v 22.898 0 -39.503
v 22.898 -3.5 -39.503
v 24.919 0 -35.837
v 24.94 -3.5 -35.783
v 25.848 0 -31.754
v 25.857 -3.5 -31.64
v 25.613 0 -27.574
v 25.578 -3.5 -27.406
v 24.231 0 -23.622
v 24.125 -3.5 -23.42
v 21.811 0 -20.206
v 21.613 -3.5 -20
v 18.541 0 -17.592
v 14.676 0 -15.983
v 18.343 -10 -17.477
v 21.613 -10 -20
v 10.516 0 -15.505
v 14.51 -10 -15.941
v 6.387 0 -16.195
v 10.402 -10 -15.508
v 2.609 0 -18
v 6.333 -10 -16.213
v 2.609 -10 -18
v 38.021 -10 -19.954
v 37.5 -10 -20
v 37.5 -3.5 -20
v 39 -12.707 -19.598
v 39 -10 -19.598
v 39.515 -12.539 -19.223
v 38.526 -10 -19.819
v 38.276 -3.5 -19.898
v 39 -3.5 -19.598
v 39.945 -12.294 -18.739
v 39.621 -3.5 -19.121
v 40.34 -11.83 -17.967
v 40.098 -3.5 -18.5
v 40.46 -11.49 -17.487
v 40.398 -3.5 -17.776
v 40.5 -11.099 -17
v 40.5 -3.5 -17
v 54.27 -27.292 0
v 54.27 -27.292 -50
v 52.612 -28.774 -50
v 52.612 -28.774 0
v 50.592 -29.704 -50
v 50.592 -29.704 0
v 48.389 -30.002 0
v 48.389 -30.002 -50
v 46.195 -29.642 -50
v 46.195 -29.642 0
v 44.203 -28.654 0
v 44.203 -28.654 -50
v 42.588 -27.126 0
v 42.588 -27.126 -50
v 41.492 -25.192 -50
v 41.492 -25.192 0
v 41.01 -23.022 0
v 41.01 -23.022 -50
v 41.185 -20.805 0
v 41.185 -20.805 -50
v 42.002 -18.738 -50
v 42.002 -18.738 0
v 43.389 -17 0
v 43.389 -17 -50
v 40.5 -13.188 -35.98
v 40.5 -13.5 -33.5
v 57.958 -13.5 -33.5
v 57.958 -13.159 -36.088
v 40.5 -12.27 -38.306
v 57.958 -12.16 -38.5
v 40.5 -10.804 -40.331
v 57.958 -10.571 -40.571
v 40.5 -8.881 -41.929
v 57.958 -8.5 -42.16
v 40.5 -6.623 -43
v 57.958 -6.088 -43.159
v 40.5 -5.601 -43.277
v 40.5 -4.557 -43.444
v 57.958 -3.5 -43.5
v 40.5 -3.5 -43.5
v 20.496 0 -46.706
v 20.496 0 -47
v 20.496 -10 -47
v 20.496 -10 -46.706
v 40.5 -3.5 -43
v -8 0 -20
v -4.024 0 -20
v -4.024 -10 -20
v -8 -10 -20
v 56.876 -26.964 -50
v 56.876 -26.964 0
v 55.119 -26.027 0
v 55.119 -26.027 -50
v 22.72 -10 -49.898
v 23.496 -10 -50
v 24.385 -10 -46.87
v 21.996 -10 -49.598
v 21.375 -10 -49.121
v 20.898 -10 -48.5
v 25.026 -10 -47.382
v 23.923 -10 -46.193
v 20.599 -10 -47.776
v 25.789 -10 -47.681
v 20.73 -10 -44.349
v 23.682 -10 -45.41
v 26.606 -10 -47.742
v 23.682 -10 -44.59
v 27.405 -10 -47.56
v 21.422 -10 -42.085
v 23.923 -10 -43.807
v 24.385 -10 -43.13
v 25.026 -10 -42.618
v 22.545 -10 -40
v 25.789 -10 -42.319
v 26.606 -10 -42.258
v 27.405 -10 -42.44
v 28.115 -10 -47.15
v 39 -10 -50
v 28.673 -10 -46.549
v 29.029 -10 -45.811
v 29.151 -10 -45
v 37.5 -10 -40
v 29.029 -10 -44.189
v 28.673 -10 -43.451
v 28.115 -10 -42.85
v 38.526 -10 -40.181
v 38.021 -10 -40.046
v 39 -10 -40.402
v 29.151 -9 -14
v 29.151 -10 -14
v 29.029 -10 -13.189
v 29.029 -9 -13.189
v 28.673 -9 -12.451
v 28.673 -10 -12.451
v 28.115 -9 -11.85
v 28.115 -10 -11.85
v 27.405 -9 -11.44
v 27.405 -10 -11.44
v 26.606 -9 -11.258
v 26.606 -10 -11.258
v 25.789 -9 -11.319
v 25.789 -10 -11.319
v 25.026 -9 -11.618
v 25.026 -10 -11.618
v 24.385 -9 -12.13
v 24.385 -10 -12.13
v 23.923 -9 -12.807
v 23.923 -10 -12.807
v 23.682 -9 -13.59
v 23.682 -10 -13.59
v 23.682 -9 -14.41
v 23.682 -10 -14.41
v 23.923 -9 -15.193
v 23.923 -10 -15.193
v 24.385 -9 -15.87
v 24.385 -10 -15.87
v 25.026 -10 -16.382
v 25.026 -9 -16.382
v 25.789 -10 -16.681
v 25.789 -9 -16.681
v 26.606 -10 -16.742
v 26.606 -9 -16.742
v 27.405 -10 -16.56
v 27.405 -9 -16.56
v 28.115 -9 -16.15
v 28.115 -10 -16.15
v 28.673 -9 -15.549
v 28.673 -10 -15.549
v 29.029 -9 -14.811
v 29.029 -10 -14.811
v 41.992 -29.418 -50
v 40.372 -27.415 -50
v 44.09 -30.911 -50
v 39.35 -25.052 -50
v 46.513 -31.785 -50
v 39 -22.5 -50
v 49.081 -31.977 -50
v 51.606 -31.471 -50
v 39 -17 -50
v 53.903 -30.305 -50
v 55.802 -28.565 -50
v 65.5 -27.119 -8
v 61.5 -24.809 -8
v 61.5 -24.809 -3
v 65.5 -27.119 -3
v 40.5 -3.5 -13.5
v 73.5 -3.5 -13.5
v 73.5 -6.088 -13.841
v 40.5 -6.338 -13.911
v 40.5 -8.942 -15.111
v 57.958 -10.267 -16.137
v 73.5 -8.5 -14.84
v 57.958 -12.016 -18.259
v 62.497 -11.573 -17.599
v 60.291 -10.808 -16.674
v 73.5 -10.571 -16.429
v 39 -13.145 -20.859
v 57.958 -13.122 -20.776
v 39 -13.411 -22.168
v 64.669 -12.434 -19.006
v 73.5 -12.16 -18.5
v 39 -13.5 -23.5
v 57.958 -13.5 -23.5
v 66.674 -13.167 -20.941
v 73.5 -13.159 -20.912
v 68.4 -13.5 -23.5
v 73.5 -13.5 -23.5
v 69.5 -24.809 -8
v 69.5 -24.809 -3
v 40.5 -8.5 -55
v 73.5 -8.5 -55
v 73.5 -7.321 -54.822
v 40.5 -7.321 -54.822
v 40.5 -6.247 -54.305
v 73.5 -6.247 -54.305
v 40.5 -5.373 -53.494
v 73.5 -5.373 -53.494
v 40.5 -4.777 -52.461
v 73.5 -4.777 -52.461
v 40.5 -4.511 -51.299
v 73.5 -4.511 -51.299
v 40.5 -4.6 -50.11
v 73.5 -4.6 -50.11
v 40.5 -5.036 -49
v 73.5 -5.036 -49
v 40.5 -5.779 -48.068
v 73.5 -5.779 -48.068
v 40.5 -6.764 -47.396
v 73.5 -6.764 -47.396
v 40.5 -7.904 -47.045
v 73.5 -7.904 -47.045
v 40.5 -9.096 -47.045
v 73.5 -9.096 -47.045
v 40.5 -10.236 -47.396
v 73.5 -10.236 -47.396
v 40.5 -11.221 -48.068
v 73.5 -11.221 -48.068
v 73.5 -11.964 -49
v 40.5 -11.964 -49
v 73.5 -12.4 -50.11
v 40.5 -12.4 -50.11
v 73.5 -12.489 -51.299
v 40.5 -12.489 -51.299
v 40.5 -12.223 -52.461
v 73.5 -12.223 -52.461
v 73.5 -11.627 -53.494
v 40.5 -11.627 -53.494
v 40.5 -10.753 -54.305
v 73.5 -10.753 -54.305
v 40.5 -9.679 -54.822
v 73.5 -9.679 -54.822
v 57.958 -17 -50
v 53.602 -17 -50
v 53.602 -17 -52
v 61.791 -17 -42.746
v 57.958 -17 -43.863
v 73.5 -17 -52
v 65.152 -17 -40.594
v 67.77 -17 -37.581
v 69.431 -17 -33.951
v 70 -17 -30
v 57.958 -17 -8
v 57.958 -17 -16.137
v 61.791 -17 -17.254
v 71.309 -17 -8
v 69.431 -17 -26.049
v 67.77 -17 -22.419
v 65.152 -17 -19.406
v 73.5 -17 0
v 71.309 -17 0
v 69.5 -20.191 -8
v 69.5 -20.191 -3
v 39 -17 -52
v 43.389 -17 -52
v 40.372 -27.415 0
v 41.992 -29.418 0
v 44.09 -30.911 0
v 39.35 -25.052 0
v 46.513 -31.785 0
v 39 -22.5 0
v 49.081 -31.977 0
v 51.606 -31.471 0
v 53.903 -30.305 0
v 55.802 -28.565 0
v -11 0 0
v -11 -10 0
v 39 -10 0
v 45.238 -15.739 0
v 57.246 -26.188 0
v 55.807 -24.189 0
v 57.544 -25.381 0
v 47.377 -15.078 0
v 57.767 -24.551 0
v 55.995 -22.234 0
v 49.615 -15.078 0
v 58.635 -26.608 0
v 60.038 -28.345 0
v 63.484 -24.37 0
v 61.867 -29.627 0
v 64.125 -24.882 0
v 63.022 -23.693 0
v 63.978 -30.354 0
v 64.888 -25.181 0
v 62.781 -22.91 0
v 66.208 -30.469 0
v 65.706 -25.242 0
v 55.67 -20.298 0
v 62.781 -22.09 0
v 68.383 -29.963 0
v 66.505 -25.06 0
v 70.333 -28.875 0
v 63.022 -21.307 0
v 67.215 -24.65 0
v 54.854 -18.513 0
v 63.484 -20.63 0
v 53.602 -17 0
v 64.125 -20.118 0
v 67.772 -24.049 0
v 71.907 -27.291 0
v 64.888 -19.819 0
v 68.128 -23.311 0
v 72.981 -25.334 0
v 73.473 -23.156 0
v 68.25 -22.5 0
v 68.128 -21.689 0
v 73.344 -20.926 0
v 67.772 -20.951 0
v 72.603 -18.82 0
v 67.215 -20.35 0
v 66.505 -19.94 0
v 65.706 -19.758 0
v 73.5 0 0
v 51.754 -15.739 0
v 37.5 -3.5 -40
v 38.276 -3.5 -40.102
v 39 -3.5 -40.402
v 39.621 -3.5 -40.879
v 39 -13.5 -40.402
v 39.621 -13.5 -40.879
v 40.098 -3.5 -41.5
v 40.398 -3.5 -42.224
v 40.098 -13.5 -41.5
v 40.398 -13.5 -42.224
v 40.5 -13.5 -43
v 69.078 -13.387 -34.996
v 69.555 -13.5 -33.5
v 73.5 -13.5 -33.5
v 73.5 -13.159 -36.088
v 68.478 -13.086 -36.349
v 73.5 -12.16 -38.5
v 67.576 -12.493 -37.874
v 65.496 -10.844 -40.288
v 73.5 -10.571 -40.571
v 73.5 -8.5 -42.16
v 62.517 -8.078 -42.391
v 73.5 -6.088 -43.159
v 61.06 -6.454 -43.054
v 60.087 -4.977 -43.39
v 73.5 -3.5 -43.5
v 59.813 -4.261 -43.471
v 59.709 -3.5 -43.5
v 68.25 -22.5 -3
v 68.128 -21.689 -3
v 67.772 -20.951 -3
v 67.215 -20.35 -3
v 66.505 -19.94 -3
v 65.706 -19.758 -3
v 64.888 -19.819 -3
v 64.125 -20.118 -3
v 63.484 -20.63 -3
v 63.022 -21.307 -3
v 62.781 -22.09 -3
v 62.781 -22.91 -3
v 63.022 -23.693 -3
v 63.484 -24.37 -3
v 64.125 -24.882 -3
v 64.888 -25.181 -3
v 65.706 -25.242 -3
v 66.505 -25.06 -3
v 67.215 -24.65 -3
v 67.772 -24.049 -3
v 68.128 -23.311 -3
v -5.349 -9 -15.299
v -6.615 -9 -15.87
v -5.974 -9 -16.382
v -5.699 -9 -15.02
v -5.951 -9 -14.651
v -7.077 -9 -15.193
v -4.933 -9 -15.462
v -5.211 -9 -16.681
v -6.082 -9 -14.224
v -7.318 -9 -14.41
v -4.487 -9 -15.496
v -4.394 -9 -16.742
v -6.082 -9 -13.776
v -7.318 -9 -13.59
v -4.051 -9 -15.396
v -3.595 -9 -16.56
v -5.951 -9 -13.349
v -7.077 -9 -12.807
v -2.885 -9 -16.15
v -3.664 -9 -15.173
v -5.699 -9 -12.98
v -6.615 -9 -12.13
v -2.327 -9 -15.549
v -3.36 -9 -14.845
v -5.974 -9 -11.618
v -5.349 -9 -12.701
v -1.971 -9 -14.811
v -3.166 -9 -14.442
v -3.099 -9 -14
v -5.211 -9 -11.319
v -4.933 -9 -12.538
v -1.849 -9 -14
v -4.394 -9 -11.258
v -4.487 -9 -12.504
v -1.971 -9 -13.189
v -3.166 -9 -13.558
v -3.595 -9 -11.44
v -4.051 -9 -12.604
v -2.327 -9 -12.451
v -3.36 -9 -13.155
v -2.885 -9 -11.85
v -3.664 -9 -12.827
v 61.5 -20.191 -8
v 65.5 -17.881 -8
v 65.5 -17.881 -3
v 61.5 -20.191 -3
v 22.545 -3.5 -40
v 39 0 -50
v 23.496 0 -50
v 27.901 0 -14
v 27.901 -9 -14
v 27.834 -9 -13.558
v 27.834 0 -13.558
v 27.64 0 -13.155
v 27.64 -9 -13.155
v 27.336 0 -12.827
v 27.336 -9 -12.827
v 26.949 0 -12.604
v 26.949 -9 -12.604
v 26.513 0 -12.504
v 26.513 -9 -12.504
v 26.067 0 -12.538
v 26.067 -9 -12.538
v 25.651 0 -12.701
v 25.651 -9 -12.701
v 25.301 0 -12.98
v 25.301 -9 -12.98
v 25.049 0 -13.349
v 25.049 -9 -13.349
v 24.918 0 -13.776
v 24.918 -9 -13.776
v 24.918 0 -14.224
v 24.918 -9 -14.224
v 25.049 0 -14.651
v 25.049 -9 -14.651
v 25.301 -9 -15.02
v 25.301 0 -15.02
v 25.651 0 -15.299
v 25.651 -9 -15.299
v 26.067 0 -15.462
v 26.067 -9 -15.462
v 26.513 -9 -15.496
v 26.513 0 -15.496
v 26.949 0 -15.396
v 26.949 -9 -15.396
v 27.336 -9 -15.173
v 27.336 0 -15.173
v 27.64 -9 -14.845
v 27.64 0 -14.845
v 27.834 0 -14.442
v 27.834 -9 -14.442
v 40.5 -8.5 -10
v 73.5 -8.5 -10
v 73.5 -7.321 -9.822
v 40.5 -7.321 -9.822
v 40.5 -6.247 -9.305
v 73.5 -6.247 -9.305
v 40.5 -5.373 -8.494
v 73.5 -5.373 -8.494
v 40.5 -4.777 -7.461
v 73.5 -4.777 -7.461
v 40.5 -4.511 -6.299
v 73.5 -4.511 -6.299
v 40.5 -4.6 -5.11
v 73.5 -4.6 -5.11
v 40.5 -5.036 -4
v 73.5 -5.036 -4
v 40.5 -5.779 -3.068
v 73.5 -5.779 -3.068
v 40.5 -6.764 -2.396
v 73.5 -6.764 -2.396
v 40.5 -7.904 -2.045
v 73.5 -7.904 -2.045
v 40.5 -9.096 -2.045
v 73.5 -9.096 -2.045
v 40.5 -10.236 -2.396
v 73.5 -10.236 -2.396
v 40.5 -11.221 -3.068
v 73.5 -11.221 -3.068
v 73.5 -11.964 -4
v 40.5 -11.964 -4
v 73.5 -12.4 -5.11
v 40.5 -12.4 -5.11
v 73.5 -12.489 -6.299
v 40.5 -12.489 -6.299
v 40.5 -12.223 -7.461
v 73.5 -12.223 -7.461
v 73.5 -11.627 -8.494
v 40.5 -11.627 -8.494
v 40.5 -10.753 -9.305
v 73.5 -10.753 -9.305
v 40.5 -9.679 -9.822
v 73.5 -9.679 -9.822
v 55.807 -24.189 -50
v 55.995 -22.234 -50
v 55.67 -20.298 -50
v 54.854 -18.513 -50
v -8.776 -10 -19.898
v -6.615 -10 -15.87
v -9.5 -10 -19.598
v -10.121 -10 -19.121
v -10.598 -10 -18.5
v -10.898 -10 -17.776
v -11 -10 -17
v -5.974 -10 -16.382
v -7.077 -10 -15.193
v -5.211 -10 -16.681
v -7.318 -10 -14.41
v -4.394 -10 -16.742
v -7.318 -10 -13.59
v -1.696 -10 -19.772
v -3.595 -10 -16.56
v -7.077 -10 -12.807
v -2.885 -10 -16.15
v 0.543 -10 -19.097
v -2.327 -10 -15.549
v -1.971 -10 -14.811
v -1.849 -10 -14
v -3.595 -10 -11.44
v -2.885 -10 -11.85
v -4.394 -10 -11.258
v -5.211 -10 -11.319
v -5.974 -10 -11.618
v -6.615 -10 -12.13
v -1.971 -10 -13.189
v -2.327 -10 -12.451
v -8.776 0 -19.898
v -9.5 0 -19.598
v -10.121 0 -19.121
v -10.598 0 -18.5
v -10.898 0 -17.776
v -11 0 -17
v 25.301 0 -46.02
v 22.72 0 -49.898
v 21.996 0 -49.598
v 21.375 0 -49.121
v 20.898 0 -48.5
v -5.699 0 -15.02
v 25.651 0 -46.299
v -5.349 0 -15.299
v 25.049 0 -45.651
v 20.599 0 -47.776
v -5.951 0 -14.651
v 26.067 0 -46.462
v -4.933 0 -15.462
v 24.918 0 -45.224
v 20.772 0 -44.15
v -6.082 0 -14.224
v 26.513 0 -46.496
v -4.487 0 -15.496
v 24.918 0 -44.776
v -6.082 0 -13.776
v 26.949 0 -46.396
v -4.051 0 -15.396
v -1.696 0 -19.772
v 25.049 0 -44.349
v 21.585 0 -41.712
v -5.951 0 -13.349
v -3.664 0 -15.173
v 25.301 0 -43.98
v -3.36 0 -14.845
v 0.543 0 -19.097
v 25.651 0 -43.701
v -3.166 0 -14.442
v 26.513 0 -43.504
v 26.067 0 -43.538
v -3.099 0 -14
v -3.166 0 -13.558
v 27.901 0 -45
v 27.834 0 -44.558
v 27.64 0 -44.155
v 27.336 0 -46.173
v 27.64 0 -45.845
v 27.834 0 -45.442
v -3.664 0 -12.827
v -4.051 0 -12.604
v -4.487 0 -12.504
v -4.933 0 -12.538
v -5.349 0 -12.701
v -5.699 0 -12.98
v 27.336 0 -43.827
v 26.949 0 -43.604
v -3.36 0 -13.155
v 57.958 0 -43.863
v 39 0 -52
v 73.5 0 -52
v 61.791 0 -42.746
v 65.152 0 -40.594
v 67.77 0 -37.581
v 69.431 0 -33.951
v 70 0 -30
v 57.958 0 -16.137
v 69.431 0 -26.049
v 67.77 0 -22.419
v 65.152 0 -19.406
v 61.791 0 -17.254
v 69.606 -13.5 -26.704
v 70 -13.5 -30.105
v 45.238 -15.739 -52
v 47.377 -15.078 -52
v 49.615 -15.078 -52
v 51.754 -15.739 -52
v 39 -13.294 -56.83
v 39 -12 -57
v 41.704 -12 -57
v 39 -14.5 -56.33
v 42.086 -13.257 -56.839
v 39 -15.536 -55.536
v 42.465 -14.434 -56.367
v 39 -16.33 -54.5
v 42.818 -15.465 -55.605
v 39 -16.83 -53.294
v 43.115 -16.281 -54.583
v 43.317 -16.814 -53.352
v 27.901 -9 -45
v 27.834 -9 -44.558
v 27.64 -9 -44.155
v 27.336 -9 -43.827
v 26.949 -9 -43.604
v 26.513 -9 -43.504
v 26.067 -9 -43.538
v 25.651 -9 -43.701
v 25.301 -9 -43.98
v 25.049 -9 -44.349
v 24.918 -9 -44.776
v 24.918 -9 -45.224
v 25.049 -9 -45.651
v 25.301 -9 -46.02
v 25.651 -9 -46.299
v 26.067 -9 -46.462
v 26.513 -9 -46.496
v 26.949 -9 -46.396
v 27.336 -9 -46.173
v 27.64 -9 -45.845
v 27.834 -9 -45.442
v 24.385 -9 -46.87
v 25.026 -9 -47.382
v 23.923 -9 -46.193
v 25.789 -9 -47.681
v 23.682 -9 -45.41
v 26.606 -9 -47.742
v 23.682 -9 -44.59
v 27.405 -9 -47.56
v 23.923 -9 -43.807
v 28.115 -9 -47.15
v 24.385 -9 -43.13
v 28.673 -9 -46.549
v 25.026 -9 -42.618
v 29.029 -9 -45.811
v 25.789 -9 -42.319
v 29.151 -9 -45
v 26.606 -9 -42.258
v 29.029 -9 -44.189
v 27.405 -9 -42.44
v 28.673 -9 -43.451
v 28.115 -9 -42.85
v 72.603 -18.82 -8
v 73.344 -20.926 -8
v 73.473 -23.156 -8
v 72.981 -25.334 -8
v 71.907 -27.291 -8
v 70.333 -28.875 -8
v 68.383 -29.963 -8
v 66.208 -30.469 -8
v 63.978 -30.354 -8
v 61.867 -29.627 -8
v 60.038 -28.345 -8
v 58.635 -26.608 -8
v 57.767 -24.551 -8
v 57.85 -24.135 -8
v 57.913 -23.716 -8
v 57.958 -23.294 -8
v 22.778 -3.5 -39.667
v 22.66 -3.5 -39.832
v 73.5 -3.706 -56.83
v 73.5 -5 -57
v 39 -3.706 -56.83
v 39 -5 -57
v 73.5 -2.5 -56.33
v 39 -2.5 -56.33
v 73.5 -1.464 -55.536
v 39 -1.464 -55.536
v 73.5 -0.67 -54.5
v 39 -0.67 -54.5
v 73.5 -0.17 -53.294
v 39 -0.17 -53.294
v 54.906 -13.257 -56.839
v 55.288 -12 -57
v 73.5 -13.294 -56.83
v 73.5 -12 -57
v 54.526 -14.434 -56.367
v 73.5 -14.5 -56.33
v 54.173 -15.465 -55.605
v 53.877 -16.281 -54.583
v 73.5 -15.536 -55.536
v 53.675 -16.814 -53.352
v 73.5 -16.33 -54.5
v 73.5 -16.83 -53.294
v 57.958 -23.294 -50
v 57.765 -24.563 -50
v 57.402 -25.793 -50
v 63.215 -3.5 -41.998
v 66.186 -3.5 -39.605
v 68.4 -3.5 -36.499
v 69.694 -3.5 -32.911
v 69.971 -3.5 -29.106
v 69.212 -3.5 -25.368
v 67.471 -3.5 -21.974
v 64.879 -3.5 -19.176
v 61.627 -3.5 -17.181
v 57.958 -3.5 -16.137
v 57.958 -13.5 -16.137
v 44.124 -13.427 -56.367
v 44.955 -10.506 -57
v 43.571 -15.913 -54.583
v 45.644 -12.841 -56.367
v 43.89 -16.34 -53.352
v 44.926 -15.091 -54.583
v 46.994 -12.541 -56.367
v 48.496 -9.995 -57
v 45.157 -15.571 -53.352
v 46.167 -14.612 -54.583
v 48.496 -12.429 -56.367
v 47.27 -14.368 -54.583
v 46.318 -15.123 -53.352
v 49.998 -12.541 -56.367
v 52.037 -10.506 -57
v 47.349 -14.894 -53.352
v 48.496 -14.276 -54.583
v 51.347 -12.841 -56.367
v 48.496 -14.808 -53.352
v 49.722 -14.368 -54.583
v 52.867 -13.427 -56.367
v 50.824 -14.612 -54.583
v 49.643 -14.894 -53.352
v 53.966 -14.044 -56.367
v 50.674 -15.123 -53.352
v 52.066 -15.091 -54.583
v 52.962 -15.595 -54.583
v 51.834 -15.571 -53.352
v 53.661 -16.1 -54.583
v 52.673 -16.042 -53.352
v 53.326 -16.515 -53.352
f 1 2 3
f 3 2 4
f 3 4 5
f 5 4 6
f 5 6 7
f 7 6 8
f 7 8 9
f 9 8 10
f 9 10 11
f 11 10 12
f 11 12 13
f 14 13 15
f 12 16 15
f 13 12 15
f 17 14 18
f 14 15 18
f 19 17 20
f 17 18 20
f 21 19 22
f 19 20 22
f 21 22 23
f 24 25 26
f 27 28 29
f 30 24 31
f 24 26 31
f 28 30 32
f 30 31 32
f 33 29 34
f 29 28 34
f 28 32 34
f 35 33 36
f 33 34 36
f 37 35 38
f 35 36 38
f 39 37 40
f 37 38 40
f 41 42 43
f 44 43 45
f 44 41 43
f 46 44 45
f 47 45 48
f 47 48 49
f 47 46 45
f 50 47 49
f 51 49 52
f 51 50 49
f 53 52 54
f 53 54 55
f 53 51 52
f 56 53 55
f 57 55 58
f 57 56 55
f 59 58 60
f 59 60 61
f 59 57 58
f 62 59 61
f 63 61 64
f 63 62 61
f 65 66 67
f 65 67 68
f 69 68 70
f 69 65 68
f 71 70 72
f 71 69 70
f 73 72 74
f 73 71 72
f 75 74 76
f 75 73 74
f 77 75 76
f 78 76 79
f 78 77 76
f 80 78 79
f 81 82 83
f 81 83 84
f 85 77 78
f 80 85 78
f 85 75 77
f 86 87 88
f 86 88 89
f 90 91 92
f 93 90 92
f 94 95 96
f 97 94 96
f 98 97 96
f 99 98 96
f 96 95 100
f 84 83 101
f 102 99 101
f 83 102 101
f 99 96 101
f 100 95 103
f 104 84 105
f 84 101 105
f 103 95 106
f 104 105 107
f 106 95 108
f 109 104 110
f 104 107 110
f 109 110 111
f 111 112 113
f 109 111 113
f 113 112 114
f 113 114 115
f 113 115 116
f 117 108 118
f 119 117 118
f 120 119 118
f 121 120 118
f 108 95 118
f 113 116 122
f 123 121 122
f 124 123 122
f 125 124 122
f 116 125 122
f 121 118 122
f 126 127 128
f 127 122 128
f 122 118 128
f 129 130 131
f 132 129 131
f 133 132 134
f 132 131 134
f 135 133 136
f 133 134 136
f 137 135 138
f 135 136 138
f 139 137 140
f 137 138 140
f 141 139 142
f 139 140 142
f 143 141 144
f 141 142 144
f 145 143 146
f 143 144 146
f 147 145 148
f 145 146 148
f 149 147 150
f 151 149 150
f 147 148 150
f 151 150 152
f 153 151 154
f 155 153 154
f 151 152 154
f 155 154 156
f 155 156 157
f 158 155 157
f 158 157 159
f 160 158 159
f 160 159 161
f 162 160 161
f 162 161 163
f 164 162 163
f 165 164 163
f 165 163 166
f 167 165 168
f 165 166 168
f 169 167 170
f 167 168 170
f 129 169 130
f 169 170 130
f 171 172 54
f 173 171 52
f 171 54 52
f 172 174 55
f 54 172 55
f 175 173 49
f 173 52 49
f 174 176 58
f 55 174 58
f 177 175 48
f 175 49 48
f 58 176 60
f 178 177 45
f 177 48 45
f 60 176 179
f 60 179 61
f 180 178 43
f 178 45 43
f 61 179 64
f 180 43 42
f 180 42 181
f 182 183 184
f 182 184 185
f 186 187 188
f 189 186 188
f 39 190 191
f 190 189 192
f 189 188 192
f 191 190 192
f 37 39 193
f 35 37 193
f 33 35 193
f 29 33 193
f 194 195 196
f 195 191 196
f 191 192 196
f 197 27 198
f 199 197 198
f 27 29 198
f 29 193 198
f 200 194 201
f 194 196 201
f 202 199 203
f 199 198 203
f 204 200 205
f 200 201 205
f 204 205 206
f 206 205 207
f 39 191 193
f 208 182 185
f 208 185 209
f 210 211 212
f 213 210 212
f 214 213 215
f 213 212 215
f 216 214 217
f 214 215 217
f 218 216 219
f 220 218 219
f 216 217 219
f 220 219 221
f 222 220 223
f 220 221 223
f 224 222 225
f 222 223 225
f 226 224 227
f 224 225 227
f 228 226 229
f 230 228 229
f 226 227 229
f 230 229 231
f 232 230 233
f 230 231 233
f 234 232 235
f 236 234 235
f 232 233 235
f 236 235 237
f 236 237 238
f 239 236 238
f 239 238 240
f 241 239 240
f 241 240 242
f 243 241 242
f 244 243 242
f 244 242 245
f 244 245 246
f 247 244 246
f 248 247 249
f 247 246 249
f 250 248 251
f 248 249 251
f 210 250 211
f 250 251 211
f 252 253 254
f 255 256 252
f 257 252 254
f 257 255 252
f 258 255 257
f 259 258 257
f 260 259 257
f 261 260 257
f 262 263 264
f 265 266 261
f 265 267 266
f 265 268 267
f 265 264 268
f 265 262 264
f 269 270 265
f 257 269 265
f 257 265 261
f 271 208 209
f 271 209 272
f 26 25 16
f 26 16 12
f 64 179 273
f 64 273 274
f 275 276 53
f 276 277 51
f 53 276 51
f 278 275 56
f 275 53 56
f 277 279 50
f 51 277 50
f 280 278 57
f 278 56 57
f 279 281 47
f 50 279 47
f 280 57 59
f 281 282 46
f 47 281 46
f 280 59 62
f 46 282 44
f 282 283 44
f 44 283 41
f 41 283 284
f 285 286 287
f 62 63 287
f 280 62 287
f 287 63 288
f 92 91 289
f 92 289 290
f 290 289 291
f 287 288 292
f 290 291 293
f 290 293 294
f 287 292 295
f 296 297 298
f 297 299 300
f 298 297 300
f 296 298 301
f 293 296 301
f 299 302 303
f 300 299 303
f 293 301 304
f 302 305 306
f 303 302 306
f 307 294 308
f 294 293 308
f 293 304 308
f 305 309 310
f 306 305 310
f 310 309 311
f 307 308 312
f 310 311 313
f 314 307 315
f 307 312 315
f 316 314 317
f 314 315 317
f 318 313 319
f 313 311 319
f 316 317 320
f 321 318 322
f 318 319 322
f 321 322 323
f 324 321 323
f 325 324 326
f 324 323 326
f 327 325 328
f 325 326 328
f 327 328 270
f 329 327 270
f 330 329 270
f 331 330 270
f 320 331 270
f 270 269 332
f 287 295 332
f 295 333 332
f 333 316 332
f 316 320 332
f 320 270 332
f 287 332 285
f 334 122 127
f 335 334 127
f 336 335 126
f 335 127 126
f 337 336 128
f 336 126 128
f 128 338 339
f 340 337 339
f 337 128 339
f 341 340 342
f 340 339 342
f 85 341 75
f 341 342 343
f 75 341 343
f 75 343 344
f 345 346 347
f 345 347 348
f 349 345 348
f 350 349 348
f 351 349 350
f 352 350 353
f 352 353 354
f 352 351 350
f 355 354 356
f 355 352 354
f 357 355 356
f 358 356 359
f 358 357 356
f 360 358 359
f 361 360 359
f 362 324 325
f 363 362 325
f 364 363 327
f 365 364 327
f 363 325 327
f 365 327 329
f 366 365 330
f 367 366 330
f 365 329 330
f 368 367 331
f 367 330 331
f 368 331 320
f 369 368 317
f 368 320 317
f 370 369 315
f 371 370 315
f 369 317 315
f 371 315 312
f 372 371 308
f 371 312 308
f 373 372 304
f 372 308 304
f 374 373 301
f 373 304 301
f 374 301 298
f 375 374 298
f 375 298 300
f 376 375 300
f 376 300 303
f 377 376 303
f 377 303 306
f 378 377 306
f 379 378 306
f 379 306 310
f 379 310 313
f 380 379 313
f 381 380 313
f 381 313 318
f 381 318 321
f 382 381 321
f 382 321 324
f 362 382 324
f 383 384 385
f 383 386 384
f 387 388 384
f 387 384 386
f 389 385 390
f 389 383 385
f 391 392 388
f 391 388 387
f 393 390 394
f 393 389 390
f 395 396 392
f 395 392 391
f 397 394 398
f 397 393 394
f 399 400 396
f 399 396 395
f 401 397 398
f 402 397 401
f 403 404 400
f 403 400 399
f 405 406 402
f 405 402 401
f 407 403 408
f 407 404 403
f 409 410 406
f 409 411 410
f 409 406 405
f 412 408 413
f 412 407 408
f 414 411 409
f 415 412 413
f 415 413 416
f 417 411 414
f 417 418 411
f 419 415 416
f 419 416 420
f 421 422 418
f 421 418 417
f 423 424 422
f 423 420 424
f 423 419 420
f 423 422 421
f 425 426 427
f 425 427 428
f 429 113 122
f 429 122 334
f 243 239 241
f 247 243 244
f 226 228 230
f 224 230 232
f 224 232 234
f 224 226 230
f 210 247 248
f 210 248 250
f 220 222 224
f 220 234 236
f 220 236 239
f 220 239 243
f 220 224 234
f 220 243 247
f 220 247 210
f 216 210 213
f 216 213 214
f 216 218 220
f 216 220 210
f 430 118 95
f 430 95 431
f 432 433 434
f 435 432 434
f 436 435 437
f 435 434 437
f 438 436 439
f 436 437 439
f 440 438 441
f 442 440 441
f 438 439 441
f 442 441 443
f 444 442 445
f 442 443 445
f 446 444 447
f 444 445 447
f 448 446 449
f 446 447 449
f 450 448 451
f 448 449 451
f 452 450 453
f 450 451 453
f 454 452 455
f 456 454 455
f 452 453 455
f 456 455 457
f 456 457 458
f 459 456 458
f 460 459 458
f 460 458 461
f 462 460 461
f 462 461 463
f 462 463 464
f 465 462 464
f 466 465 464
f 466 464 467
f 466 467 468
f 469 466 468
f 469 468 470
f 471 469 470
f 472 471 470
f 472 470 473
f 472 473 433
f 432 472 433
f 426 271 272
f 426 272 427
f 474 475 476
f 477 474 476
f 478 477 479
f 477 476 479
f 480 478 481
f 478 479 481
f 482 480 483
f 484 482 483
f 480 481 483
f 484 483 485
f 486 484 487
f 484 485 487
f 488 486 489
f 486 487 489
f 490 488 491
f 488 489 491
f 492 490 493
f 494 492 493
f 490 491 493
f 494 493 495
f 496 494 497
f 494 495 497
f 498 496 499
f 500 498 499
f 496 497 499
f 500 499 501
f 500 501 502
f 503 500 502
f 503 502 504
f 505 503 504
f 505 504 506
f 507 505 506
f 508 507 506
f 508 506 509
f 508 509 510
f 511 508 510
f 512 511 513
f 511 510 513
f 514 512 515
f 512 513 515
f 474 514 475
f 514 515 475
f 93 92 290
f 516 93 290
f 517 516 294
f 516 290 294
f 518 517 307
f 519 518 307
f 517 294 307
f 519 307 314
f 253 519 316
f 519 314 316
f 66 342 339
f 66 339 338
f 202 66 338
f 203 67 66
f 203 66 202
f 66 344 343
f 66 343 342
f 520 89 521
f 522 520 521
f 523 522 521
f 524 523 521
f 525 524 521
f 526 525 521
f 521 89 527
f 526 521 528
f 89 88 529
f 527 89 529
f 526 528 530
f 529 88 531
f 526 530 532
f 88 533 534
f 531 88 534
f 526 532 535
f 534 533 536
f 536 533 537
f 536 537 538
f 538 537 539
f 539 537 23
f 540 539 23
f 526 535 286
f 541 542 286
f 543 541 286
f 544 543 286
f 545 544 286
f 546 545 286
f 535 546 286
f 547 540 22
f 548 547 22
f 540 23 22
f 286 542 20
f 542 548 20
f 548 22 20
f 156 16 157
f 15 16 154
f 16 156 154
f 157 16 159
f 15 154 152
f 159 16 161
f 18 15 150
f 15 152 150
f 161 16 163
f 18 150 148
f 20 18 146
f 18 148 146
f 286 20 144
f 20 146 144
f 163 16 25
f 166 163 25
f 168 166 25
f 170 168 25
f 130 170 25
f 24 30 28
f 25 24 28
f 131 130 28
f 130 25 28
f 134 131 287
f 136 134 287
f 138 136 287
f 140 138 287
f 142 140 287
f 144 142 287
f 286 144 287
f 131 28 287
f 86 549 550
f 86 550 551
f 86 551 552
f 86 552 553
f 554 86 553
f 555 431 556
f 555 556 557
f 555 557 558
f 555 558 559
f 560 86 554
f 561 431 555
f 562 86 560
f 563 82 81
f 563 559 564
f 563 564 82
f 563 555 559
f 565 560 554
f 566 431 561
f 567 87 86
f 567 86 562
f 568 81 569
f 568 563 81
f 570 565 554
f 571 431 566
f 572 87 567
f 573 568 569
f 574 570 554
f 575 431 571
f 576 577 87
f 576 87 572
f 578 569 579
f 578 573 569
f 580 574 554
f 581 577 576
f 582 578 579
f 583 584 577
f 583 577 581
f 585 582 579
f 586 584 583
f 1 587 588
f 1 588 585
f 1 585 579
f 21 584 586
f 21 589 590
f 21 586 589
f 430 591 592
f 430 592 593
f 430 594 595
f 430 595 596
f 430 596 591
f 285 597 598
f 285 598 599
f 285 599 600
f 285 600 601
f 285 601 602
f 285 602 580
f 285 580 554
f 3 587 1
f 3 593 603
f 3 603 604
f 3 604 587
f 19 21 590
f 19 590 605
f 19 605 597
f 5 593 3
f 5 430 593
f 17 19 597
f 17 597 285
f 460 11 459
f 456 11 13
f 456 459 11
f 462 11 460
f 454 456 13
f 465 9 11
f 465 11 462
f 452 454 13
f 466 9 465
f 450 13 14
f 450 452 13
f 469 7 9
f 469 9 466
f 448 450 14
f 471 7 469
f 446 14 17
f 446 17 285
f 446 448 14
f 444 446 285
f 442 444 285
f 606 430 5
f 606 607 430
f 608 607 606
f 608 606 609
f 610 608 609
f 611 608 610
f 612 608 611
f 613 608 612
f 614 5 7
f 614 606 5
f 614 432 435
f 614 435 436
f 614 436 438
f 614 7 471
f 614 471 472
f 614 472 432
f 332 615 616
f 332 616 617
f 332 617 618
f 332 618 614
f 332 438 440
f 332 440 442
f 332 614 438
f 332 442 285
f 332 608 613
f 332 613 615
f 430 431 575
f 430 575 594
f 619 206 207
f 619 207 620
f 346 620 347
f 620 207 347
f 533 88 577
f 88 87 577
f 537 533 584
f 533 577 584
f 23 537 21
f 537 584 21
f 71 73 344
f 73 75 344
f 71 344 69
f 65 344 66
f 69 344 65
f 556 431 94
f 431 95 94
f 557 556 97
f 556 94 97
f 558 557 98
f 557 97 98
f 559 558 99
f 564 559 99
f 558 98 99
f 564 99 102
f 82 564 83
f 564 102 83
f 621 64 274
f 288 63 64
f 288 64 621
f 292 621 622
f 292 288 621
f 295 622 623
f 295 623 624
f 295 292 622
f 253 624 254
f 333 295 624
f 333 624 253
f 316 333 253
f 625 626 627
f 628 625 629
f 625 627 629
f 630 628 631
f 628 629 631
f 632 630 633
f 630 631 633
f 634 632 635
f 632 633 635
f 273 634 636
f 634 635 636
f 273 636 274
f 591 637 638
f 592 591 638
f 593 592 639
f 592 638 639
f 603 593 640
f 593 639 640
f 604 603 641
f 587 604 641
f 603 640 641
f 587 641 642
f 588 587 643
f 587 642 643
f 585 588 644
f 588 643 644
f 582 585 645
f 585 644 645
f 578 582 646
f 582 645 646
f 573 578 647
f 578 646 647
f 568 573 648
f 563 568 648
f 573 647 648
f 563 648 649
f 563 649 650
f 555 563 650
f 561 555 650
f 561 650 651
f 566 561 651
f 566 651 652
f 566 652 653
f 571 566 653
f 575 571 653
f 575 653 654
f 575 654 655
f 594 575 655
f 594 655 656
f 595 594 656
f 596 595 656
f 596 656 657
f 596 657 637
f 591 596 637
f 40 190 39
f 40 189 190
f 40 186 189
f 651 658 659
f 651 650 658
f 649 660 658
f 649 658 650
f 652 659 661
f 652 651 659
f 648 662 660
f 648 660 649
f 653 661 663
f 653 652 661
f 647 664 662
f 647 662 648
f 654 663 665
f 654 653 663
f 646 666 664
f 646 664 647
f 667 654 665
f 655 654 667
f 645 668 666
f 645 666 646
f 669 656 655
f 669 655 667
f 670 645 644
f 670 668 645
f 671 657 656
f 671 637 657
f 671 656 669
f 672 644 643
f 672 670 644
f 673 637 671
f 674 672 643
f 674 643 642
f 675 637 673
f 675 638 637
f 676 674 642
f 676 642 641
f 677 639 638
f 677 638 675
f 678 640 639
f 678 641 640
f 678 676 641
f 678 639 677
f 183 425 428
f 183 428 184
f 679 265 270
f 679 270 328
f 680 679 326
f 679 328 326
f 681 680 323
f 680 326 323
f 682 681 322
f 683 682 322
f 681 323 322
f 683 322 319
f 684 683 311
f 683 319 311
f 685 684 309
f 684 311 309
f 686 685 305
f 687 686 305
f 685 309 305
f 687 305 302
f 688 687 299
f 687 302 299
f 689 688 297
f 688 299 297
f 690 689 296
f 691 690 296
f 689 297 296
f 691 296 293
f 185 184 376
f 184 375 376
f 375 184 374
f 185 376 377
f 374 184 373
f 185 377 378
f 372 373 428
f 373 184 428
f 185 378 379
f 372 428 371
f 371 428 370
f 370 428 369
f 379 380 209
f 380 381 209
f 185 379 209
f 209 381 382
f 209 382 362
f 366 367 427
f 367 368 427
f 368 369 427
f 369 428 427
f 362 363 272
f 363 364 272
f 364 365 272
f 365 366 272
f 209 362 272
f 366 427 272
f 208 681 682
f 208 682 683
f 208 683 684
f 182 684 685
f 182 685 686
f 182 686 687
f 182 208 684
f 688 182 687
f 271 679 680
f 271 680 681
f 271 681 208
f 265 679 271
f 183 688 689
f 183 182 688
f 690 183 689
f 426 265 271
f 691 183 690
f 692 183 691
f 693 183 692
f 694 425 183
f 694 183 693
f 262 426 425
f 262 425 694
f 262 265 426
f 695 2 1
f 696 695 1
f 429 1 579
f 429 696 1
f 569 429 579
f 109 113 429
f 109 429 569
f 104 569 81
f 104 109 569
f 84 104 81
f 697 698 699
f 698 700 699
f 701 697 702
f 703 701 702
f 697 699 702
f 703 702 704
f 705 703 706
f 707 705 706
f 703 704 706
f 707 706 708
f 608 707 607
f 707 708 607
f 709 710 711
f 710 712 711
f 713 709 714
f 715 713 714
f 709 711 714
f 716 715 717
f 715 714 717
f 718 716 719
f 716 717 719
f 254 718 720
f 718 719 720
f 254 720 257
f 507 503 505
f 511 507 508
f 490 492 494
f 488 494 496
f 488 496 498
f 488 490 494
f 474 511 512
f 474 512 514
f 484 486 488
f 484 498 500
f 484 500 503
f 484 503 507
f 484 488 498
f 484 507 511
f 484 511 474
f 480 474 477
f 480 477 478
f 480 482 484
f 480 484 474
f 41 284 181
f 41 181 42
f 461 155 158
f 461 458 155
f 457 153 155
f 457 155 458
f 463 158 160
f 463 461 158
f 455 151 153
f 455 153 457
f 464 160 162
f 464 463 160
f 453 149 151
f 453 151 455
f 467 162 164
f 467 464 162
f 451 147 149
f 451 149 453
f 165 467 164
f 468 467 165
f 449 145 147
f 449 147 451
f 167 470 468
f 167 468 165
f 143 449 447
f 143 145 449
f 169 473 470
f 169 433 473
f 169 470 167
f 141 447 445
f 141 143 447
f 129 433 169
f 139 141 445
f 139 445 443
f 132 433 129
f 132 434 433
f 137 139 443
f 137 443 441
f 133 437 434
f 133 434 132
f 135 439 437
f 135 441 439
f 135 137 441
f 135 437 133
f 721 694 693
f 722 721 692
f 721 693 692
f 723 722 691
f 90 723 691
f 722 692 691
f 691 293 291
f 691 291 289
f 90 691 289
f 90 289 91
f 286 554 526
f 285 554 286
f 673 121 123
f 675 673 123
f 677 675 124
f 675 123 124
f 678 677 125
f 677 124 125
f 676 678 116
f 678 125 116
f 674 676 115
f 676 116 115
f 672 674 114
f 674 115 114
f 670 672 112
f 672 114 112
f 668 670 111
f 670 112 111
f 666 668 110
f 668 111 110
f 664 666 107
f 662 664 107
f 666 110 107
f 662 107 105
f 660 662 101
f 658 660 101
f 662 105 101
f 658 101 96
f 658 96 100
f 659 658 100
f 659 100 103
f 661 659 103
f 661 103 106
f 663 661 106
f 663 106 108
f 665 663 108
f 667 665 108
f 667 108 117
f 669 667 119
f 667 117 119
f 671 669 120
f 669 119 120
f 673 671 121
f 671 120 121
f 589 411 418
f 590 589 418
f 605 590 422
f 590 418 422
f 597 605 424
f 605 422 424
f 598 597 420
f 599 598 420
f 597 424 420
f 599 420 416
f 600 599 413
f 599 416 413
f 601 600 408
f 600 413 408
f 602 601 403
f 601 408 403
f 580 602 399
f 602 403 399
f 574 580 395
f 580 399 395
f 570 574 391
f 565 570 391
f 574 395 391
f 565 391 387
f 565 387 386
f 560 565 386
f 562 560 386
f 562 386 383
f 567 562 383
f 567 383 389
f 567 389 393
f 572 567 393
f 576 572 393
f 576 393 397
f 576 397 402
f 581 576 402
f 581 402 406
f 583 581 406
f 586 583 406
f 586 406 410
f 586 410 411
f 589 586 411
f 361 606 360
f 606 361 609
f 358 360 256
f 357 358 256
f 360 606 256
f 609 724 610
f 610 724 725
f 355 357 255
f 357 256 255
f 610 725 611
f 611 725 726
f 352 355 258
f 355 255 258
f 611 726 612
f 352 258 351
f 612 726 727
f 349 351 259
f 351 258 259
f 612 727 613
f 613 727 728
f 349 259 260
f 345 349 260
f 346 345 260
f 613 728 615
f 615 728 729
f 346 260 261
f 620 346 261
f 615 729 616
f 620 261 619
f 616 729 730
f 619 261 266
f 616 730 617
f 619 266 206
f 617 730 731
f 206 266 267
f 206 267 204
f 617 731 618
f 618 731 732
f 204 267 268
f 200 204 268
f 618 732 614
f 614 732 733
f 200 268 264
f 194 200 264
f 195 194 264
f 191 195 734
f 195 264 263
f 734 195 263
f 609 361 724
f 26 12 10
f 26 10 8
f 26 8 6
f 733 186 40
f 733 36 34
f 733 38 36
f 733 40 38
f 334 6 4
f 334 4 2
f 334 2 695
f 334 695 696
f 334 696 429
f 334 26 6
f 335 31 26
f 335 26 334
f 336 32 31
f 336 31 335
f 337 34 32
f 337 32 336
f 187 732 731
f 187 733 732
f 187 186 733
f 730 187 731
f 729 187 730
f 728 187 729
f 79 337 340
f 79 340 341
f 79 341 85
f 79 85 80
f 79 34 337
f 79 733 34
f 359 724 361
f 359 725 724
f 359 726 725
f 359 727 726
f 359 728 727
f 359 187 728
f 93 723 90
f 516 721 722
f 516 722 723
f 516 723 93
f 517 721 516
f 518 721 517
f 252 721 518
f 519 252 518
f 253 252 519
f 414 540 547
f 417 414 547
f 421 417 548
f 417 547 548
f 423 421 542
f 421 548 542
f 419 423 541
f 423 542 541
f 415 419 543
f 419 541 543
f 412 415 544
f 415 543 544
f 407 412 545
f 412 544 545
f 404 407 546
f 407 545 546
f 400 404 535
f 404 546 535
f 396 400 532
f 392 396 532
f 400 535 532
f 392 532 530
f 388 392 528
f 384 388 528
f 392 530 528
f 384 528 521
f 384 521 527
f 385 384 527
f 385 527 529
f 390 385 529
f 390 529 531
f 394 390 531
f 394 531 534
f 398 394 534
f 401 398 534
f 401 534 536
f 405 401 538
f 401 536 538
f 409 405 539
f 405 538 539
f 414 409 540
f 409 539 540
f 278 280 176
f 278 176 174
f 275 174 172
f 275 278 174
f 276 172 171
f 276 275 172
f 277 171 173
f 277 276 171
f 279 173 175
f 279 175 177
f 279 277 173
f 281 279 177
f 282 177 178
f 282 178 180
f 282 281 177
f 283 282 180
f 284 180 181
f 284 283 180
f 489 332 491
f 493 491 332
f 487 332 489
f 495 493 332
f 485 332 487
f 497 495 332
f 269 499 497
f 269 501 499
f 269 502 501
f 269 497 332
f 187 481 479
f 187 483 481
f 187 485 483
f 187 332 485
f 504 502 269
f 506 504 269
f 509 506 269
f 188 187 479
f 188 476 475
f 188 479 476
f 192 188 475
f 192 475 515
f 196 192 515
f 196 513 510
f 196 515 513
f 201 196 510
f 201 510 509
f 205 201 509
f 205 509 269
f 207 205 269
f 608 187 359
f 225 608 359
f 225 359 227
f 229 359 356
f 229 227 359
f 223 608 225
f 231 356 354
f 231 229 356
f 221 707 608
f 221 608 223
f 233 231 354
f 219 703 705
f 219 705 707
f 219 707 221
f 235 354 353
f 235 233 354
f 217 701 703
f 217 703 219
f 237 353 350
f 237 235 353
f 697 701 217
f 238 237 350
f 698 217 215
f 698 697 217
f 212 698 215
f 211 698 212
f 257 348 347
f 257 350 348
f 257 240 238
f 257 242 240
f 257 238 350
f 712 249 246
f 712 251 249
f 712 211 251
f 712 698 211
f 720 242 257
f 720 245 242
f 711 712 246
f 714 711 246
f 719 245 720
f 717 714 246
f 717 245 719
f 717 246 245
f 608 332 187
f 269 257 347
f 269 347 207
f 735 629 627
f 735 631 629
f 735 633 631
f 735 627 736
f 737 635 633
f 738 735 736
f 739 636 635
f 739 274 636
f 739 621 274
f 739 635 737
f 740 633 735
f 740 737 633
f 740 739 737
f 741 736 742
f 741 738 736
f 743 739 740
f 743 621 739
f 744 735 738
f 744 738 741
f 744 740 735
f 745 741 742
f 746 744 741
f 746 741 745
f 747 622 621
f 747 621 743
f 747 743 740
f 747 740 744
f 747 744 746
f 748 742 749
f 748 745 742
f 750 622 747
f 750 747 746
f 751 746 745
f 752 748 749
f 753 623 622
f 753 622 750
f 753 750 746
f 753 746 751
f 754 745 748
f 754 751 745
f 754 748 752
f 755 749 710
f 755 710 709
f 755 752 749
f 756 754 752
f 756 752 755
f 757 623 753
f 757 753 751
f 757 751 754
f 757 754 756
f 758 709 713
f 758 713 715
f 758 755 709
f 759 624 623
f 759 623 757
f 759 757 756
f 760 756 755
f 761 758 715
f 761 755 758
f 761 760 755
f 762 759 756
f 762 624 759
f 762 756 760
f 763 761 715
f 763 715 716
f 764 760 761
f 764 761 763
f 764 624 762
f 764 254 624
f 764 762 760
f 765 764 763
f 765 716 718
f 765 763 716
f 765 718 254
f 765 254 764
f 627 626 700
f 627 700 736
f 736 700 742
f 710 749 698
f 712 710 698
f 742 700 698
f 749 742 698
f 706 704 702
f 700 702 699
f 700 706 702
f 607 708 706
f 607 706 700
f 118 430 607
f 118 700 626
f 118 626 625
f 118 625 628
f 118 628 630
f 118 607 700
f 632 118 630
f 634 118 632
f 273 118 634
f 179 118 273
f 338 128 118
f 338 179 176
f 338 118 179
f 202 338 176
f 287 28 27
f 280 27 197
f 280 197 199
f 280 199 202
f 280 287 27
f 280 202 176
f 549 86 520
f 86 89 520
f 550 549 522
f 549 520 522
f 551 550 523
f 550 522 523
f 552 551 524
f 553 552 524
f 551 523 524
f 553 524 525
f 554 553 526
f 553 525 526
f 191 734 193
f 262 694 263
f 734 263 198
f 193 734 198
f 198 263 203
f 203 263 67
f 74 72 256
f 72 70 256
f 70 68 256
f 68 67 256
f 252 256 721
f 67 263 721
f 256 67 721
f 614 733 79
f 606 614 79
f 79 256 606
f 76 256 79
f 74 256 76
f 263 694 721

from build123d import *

# Parameters (mm, degrees)
EXTRUDE1_DEPTH  = 57
SKETCH2_R       = 2.75
EXTRUDE2_DEPTH  = 8
EXTRUDE3_DEPTH  = 5
EXTRUDE4_DEPTH  = 50
SKETCH5_R       = 4
EXTRUDE5_DEPTH  = 33
SKETCH6_W       = 30
SKETCH6_H       = 10
EXTRUDE6_DEPTH  = 33
SKETCH7_W       = 50
SKETCH7_H       = 10
EXTRUDE7_DEPTH  = 50
SKETCH10_R      = 1.5
EXTRUDE10_DEPTH = 10
SKETCH11_R      = 2.75
EXTRUDE13_DEPTH = 1
SKETCH12_R      = 15
EXTRUDE14_DEPTH = 10
FILLET2_R       = 5
FILLET3_R       = 5
FILLET4_R       = 10
EXTRUDE15_REACH = 96.553
SKETCH14_W      = 20
SKETCH14_H      = 10
EXTRUDE16_DEPTH = 60
EXTRUDE18_DEPTH = 60
FILLET5_R       = 10
FILLET6_R       = 12
FILLET7_R       = 3
FILLET8_R       = 3
FILLET9_R       = 3


# Some blends are built 0.0001 mm under size
with BuildPart() as part:
    # Sketch1 → Extrude1 (new body)
    with BuildSketch(Plane.XY):
        with BuildLine():
            Line((73.499997202, -17), (73.499997202, 0))
            Line((73.499997202, 0), (39, 0))
            Line((39, 0), (39, -17))
            Line((39, -17), (43.389340395, -17))
            ThreePointArc((43.389340395, -17), (48.49587093, -14.994566191), (53.602401465, -17))
            Line((53.602401465, -17), (73.499997202, -17))
        make_face()
    extrude(amount=-EXTRUDE1_DEPTH)

    # Sketch2 → Extrude2 (add)
    with BuildSketch(Plane.XY):
        with BuildLine():
            Line((57.95839, -23.293955), (57.95839, -17))
            Line((57.95839, -17), (71.309471167, -17))
            ThreePointArc((71.309471167, -17), (69.395977388, -29.48722516), (57.767354943, -24.550891432))
            ThreePointArc((57.767354943, -24.550891432), (57.883931975, -23.925623937), (57.95839, -23.293955))
        make_face()
        with Locations((65.5, -22.5)):
            Circle(SKETCH2_R, mode=Mode.SUBTRACT)
    extrude(amount=-EXTRUDE2_DEPTH)

    # Sketch3 → Extrude3 (cut)
    with BuildSketch(Plane(origin=(0, 0, -8), x_dir=(-1, 0, 0), z_dir=(0, 0, -1))):
        Polygon((-69.5, -20.190598923), (-65.5, -17.881197846), (-61.5, -20.190598923), (-61.5, -24.809401077), (-65.5, -27.118802154), (-69.5, -24.809401077), align=None)
    extrude(amount=-EXTRUDE3_DEPTH, mode=Mode.SUBTRACT)

    # Sketch4 → Extrude4 (add)
    with BuildSketch(Plane.XY):
        with BuildLine():
            Line((39, -17), (39, -22.5))
            ThreePointArc((39, -22.5), (45.271742795, -31.43055539), (55.801591252, -28.564919557))
            Line((55.801591252, -28.564919557), (54.269524764, -27.292339419))
            ThreePointArc((54.269524764, -27.292339419), (43.338902241, -27.950290613), (43.389340395, -17))
            Line((43.389340395, -17), (39, -17))
        make_face()
        with BuildLine():
            Line((56.876362299, -26.964085637), (55.118731957, -26.027376827))
            ThreePointArc((55.118731957, -26.027376827), (55.896414133, -21.25571178), (53.602401465, -17))
            Line((53.602401465, -17), (57.95839, -17))
            Line((57.95839, -17), (57.95839, -23.293955))
            ThreePointArc((57.95839, -23.293955), (57.60414849, -25.184084529), (56.876362299, -26.964085637))
        make_face()
    extrude(amount=-EXTRUDE4_DEPTH)

    # Sketch5 → Extrude5 (cut)
    with BuildSketch(Plane(origin=(73.499997202, 0, 0), x_dir=(0, 0, -1), z_dir=(1, 0, 0))):
        with Locations((6, -8.5)):
            Circle(SKETCH5_R)
        with Locations((51, -8.5)):
            Circle(SKETCH5_R)
    extrude(amount=-EXTRUDE5_DEPTH, mode=Mode.SUBTRACT)

    # Sketch6 → Extrude6 (cut)
    with BuildSketch(Plane(origin=(73.499997202, 0, 0), x_dir=(0, 0, -1), z_dir=(1, 0, 0))):
        with Locations((28.5, -8.5)):
            Rectangle(SKETCH6_W, SKETCH6_H)
    extrude(amount=-EXTRUDE6_DEPTH, mode=Mode.SUBTRACT)

    # Sketch7 → Extrude7 (add)
    with BuildSketch(Plane.ZY.offset(-39)):
        with Locations((-25, -5)):
            Rectangle(SKETCH7_W, SKETCH7_H)
    extrude(amount=EXTRUDE7_DEPTH)

    # Sketch10 → Extrude10 (cut)
    with BuildSketch(Plane.XZ.offset(10)):
        with Locations((-4.599204374, -45)):
            Circle(SKETCH10_R)
        with Locations((26.400795626, -45)):
            Circle(SKETCH10_R)
        with Locations((26.400795626, -14)):
            Circle(SKETCH10_R)
        with Locations((-4.599204374, -14)):
            Circle(SKETCH10_R)
    extrude(amount=-EXTRUDE10_DEPTH, mode=Mode.SUBTRACT)

    # Sketch11 → Extrude13 (cut)
    with BuildSketch(Plane.XZ.offset(10)):
        with Locations((-4.599204374, -14)):
            Circle(SKETCH11_R)
        with Locations((26.400795626, -14)):
            Circle(SKETCH11_R)
        with Locations((26.400795626, -45)):
            Circle(SKETCH11_R)
    extrude(amount=-EXTRUDE13_DEPTH, mode=Mode.SUBTRACT)

    # Sketch12 → Extrude14 (cut)
    with BuildSketch(Plane.XZ.offset(10)):
        with Locations((10.900795626, -30.5)):
            Circle(SKETCH12_R)
    extrude(amount=-EXTRUDE14_DEPTH, mode=Mode.SUBTRACT)

    # Fillet2
    fillet2_edges = [part.edges().sort_by_distance(p)[0] for p in [
        (48.49587093, -14.994566191, -57),
        (63.551199334, -17, -57),
        (41.194670197, -17, -57),
    ]]
    fillet(fillet2_edges, radius=FILLET2_R)

    # Fillet3
    fillet3_edges = [part.edges().sort_by_distance(p)[0] for p in [
        (56.249998601, 0, -57),
    ]]
    fillet(fillet3_edges, radius=FILLET3_R)

    # Fillet4
    fillet4_edges = [part.edges().sort_by_distance(p)[0] for p in [
        (56.999997202, -13.5, -43.5),
    ]]
    fillet(fillet4_edges, radius=FILLET4_R - 0.0001)  # a hair under: the kernel refuses the full size

    # Extrude15: up to this face of the body (flat: up to its plane)
    extrude15_end = Plane(part.part.faces().sort_by_distance((35.938109504, 0, -24.375937497))[0])
    # Sketch13 → Extrude15 (cut, up to the picked face)
    with BuildSketch(Plane.XZ.offset(17), mode=Mode.PRIVATE) as extrude15_sk1:
        with BuildLine():
            Line((57.95839, -16.137451745), (57.95839, -43.862548255))
            ThreePointArc((57.95839, -43.862548255), (69.999997202, -30), (57.95839, -16.137451745))
        make_face()
    extrude15_tool1 = split(extrude(extrude15_sk1.sketch, amount=-EXTRUDE15_REACH, mode=Mode.PRIVATE), bisect_by=extrude15_end, keep=Keep.BOTH, mode=Mode.PRIVATE)
    add(extrude15_tool1.solids().sort_by(Axis((63.013259, -17, -30), (0, 1, 0)))[0], mode=Mode.SUBTRACT)

    # Sketch14 → Extrude16 (cut)
    with BuildSketch(Plane(origin=(40.499997202, 0, 0), x_dir=(0, 0, -1), z_dir=(1, 0, 0))):
        with Locations((30, -8.5)):
            Rectangle(SKETCH14_W, SKETCH14_H)
    extrude(amount=-EXTRUDE16_DEPTH, mode=Mode.SUBTRACT)

    # Sketch15 → Extrude18 (cut)
    with BuildSketch(Plane(origin=(0, 0, 0), x_dir=(1, 0, 0), z_dir=(0, 1, 0))):
        Polygon((2.11392048, 20), (-12.43887347, 20), (-12.43887347, 50), (20.496397049, 50), (20.496397049, 40), (2.11392048, 40), align=None)
    extrude(amount=-EXTRUDE18_DEPTH, mode=Mode.SUBTRACT)

    # Fillet5
    # the kernel refuses this fillet: 10 mm, written as the material it adds along each edge
    with BuildSketch(Plane(origin=(73.499997202, -13.5, -13.5), x_dir=(0, 1, 0), z_dir=(-1, 0, 0))) as fillet5_piece_1_section:
        with BuildLine():
            CenterArc((FILLET5_R, FILLET5_R), FILLET5_R, 180, 90)
            Line((0, FILLET5_R), (0, 0))
            Line((0, 0), (FILLET5_R, 0))
        make_face()
    fillet5_piece_1 = extrude(amount=33, mode=Mode.PRIVATE)
    fillet5_piece_1 = split(fillet5_piece_1, bisect_by=Plane(origin=(57.95839, -11.020059701, -15.351239597), z_dir=(1, 0, 0)), keep=Keep.TOP, mode=Mode.PRIVATE)
    fillet5_piece_1 = fillet5_piece_1 - Plane(origin=(55.999766898, -11.020059701, -30), x_dir=(0.13989934874108464, 0, -0.9901657296744927), z_dir=(0, -1, 0)) * Cylinder(14.000230304, 106, mode=Mode.PRIVATE)
    add(fillet5_piece_1)
    with BuildSketch(Plane(origin=(73.499997202, -13.5, -13.5), x_dir=(0, 1, 0), z_dir=(-1, 0, 0))) as fillet5_piece_2_section:
        with BuildLine():
            CenterArc((FILLET5_R, FILLET5_R), FILLET5_R, 180, 90)
            Line((0, FILLET5_R), (0, 0))
            Line((0, 0), (FILLET5_R, 0))
        make_face()
    fillet5_piece_2 = extrude(amount=33, mode=Mode.PRIVATE)
    fillet5_piece_2 = split(fillet5_piece_2, bisect_by=Plane(origin=(57.95839, -10.883667804, -15.13209824), z_dir=(-1, 0, 0)), keep=Keep.TOP, mode=Mode.PRIVATE)
    fillet5_piece_2 = fillet5_piece_2 - Plane(origin=(55.999766898, -10.883667804, -30), x_dir=(0.13989934874108464, 0, -0.9901657296744927), z_dir=(0, -1, 0)) * Cylinder(14.000230304, 106, mode=Mode.PRIVATE)
    add(fillet5_piece_2)
    with BuildSketch(Plane(origin=(73.499997202, -13.5, -13.5), x_dir=(0, 1, 0), z_dir=(-1, 0, 0))) as fillet5_piece_3_section:
        with BuildLine():
            CenterArc((FILLET5_R, FILLET5_R), FILLET5_R, 180, 90)
            Line((0, FILLET5_R), (0, 0))
            Line((0, 0), (FILLET5_R, 0))
        make_face()
    fillet5_piece_3 = extrude(amount=33, mode=Mode.PRIVATE)
    fillet5_piece_3 = split(fillet5_piece_3, bisect_by=Plane(origin=(57.95839, -12.859707332, -18.675298705), z_dir=(-1, 0, 0)), keep=Keep.TOP, mode=Mode.PRIVATE)
    fillet5_piece_3 = fillet5_piece_3 & Plane(origin=(55.999766898, -12.859707332, -30), x_dir=(0.13989934874108464, 0, -0.9901657296744927), z_dir=(0, -1, 0)) * Cylinder(14.000230304, 106, mode=Mode.PRIVATE)
    add(fillet5_piece_3)
    with BuildSketch(Plane(origin=(73.499997202, -13.5, -13.5), x_dir=(0, 1, 0), z_dir=(-1, 0, 0))) as fillet5_piece_4_section:
        with BuildLine():
            CenterArc((FILLET5_R, FILLET5_R), FILLET5_R, 180, 90)
            Line((0, FILLET5_R), (0, 0))
            Line((0, 0), (FILLET5_R, 0))
        make_face()
    fillet5_piece_4 = extrude(amount=58, mode=Mode.PRIVATE)
    fillet5_piece_4 = split(fillet5_piece_4, bisect_by=Plane(origin=(40.499997202, -11.236048857, -15.763951143), z_dir=(-1, 0, 0)), keep=Keep.TOP, mode=Mode.PRIVATE)
    fillet5_piece_4 = split(fillet5_piece_4, bisect_by=Plane(origin=(39, -11.236048857, -15.763951143), z_dir=(1, 0, 0)), keep=Keep.TOP, mode=Mode.PRIVATE)
    add(fillet5_piece_4)

    # Fillet6
    fillet6_edges = [part.edges().sort_by_distance(p)[0] for p in [
        (0.188652983, -5, -20),
        (20.496397049, -5, -42.029285899),
    ]]
    fillet(fillet6_edges, radius=FILLET6_R)

    # Fillet7
    # the kernel refuses this fillet: 3 mm, written as the material it takes off along each edge
    with BuildSketch(Plane(origin=(40.499997202, -18.59939602, -40), x_dir=(-1, 0, 0), z_dir=(0, 1, 0))) as fillet7_piece_1_section:
        with BuildLine():
            CenterArc((FILLET7_R, -FILLET7_R), FILLET7_R, 90, 90)
            Line((0, -FILLET7_R), (0, 0))
            Line((0, 0), (FILLET7_R, 0))
        make_face()
    fillet7_piece_1 = extrude(amount=15.09939602, mode=Mode.PRIVATE)
    fillet7_piece_1 = split(fillet7_piece_1, bisect_by=Plane(origin=(39.991722384, -13.5, -40.797398057), z_dir=(0, 1, 0)), keep=Keep.TOP, mode=Mode.PRIVATE)
    add(fillet7_piece_1, mode=Mode.SUBTRACT)
    with BuildSketch(Plane(origin=(40.499997202, -3.5, -20), x_dir=(-1, 0, 0), z_dir=(0, -1, 0))) as fillet7_piece_2_section:
        with BuildLine():
            CenterArc((FILLET7_R, -FILLET7_R), FILLET7_R, 90, 90)
            Line((0, -FILLET7_R), (0, 0))
            Line((0, 0), (FILLET7_R, 0))
        make_face()
    fillet7_piece_2 = extrude(amount=16.867496998, mode=Mode.PRIVATE)
    fillet7_piece_2 = fillet7_piece_2 & Plane(origin=(38.630208494, -3.5, -23.5), x_dir=(0, 1, 0), z_dir=(1, 0, 0)) * Cylinder(10, 46, mode=Mode.PRIVATE)
    add(fillet7_piece_2, mode=Mode.SUBTRACT)

    # Fillet8
    fillet8_edges = [part.edges().sort_by_distance(p)[0] for p in [
        (-11, -5, -20),
    ]]
    fillet(fillet8_edges, radius=FILLET8_R)

    # Fillet9
    fillet9_edges = [part.edges().sort_by_distance(p)[0] for p in [
        (20.496397049, -5, -50),
    ]]
    fillet(fillet9_edges, radius=FILLET9_R)


solid = part.part
